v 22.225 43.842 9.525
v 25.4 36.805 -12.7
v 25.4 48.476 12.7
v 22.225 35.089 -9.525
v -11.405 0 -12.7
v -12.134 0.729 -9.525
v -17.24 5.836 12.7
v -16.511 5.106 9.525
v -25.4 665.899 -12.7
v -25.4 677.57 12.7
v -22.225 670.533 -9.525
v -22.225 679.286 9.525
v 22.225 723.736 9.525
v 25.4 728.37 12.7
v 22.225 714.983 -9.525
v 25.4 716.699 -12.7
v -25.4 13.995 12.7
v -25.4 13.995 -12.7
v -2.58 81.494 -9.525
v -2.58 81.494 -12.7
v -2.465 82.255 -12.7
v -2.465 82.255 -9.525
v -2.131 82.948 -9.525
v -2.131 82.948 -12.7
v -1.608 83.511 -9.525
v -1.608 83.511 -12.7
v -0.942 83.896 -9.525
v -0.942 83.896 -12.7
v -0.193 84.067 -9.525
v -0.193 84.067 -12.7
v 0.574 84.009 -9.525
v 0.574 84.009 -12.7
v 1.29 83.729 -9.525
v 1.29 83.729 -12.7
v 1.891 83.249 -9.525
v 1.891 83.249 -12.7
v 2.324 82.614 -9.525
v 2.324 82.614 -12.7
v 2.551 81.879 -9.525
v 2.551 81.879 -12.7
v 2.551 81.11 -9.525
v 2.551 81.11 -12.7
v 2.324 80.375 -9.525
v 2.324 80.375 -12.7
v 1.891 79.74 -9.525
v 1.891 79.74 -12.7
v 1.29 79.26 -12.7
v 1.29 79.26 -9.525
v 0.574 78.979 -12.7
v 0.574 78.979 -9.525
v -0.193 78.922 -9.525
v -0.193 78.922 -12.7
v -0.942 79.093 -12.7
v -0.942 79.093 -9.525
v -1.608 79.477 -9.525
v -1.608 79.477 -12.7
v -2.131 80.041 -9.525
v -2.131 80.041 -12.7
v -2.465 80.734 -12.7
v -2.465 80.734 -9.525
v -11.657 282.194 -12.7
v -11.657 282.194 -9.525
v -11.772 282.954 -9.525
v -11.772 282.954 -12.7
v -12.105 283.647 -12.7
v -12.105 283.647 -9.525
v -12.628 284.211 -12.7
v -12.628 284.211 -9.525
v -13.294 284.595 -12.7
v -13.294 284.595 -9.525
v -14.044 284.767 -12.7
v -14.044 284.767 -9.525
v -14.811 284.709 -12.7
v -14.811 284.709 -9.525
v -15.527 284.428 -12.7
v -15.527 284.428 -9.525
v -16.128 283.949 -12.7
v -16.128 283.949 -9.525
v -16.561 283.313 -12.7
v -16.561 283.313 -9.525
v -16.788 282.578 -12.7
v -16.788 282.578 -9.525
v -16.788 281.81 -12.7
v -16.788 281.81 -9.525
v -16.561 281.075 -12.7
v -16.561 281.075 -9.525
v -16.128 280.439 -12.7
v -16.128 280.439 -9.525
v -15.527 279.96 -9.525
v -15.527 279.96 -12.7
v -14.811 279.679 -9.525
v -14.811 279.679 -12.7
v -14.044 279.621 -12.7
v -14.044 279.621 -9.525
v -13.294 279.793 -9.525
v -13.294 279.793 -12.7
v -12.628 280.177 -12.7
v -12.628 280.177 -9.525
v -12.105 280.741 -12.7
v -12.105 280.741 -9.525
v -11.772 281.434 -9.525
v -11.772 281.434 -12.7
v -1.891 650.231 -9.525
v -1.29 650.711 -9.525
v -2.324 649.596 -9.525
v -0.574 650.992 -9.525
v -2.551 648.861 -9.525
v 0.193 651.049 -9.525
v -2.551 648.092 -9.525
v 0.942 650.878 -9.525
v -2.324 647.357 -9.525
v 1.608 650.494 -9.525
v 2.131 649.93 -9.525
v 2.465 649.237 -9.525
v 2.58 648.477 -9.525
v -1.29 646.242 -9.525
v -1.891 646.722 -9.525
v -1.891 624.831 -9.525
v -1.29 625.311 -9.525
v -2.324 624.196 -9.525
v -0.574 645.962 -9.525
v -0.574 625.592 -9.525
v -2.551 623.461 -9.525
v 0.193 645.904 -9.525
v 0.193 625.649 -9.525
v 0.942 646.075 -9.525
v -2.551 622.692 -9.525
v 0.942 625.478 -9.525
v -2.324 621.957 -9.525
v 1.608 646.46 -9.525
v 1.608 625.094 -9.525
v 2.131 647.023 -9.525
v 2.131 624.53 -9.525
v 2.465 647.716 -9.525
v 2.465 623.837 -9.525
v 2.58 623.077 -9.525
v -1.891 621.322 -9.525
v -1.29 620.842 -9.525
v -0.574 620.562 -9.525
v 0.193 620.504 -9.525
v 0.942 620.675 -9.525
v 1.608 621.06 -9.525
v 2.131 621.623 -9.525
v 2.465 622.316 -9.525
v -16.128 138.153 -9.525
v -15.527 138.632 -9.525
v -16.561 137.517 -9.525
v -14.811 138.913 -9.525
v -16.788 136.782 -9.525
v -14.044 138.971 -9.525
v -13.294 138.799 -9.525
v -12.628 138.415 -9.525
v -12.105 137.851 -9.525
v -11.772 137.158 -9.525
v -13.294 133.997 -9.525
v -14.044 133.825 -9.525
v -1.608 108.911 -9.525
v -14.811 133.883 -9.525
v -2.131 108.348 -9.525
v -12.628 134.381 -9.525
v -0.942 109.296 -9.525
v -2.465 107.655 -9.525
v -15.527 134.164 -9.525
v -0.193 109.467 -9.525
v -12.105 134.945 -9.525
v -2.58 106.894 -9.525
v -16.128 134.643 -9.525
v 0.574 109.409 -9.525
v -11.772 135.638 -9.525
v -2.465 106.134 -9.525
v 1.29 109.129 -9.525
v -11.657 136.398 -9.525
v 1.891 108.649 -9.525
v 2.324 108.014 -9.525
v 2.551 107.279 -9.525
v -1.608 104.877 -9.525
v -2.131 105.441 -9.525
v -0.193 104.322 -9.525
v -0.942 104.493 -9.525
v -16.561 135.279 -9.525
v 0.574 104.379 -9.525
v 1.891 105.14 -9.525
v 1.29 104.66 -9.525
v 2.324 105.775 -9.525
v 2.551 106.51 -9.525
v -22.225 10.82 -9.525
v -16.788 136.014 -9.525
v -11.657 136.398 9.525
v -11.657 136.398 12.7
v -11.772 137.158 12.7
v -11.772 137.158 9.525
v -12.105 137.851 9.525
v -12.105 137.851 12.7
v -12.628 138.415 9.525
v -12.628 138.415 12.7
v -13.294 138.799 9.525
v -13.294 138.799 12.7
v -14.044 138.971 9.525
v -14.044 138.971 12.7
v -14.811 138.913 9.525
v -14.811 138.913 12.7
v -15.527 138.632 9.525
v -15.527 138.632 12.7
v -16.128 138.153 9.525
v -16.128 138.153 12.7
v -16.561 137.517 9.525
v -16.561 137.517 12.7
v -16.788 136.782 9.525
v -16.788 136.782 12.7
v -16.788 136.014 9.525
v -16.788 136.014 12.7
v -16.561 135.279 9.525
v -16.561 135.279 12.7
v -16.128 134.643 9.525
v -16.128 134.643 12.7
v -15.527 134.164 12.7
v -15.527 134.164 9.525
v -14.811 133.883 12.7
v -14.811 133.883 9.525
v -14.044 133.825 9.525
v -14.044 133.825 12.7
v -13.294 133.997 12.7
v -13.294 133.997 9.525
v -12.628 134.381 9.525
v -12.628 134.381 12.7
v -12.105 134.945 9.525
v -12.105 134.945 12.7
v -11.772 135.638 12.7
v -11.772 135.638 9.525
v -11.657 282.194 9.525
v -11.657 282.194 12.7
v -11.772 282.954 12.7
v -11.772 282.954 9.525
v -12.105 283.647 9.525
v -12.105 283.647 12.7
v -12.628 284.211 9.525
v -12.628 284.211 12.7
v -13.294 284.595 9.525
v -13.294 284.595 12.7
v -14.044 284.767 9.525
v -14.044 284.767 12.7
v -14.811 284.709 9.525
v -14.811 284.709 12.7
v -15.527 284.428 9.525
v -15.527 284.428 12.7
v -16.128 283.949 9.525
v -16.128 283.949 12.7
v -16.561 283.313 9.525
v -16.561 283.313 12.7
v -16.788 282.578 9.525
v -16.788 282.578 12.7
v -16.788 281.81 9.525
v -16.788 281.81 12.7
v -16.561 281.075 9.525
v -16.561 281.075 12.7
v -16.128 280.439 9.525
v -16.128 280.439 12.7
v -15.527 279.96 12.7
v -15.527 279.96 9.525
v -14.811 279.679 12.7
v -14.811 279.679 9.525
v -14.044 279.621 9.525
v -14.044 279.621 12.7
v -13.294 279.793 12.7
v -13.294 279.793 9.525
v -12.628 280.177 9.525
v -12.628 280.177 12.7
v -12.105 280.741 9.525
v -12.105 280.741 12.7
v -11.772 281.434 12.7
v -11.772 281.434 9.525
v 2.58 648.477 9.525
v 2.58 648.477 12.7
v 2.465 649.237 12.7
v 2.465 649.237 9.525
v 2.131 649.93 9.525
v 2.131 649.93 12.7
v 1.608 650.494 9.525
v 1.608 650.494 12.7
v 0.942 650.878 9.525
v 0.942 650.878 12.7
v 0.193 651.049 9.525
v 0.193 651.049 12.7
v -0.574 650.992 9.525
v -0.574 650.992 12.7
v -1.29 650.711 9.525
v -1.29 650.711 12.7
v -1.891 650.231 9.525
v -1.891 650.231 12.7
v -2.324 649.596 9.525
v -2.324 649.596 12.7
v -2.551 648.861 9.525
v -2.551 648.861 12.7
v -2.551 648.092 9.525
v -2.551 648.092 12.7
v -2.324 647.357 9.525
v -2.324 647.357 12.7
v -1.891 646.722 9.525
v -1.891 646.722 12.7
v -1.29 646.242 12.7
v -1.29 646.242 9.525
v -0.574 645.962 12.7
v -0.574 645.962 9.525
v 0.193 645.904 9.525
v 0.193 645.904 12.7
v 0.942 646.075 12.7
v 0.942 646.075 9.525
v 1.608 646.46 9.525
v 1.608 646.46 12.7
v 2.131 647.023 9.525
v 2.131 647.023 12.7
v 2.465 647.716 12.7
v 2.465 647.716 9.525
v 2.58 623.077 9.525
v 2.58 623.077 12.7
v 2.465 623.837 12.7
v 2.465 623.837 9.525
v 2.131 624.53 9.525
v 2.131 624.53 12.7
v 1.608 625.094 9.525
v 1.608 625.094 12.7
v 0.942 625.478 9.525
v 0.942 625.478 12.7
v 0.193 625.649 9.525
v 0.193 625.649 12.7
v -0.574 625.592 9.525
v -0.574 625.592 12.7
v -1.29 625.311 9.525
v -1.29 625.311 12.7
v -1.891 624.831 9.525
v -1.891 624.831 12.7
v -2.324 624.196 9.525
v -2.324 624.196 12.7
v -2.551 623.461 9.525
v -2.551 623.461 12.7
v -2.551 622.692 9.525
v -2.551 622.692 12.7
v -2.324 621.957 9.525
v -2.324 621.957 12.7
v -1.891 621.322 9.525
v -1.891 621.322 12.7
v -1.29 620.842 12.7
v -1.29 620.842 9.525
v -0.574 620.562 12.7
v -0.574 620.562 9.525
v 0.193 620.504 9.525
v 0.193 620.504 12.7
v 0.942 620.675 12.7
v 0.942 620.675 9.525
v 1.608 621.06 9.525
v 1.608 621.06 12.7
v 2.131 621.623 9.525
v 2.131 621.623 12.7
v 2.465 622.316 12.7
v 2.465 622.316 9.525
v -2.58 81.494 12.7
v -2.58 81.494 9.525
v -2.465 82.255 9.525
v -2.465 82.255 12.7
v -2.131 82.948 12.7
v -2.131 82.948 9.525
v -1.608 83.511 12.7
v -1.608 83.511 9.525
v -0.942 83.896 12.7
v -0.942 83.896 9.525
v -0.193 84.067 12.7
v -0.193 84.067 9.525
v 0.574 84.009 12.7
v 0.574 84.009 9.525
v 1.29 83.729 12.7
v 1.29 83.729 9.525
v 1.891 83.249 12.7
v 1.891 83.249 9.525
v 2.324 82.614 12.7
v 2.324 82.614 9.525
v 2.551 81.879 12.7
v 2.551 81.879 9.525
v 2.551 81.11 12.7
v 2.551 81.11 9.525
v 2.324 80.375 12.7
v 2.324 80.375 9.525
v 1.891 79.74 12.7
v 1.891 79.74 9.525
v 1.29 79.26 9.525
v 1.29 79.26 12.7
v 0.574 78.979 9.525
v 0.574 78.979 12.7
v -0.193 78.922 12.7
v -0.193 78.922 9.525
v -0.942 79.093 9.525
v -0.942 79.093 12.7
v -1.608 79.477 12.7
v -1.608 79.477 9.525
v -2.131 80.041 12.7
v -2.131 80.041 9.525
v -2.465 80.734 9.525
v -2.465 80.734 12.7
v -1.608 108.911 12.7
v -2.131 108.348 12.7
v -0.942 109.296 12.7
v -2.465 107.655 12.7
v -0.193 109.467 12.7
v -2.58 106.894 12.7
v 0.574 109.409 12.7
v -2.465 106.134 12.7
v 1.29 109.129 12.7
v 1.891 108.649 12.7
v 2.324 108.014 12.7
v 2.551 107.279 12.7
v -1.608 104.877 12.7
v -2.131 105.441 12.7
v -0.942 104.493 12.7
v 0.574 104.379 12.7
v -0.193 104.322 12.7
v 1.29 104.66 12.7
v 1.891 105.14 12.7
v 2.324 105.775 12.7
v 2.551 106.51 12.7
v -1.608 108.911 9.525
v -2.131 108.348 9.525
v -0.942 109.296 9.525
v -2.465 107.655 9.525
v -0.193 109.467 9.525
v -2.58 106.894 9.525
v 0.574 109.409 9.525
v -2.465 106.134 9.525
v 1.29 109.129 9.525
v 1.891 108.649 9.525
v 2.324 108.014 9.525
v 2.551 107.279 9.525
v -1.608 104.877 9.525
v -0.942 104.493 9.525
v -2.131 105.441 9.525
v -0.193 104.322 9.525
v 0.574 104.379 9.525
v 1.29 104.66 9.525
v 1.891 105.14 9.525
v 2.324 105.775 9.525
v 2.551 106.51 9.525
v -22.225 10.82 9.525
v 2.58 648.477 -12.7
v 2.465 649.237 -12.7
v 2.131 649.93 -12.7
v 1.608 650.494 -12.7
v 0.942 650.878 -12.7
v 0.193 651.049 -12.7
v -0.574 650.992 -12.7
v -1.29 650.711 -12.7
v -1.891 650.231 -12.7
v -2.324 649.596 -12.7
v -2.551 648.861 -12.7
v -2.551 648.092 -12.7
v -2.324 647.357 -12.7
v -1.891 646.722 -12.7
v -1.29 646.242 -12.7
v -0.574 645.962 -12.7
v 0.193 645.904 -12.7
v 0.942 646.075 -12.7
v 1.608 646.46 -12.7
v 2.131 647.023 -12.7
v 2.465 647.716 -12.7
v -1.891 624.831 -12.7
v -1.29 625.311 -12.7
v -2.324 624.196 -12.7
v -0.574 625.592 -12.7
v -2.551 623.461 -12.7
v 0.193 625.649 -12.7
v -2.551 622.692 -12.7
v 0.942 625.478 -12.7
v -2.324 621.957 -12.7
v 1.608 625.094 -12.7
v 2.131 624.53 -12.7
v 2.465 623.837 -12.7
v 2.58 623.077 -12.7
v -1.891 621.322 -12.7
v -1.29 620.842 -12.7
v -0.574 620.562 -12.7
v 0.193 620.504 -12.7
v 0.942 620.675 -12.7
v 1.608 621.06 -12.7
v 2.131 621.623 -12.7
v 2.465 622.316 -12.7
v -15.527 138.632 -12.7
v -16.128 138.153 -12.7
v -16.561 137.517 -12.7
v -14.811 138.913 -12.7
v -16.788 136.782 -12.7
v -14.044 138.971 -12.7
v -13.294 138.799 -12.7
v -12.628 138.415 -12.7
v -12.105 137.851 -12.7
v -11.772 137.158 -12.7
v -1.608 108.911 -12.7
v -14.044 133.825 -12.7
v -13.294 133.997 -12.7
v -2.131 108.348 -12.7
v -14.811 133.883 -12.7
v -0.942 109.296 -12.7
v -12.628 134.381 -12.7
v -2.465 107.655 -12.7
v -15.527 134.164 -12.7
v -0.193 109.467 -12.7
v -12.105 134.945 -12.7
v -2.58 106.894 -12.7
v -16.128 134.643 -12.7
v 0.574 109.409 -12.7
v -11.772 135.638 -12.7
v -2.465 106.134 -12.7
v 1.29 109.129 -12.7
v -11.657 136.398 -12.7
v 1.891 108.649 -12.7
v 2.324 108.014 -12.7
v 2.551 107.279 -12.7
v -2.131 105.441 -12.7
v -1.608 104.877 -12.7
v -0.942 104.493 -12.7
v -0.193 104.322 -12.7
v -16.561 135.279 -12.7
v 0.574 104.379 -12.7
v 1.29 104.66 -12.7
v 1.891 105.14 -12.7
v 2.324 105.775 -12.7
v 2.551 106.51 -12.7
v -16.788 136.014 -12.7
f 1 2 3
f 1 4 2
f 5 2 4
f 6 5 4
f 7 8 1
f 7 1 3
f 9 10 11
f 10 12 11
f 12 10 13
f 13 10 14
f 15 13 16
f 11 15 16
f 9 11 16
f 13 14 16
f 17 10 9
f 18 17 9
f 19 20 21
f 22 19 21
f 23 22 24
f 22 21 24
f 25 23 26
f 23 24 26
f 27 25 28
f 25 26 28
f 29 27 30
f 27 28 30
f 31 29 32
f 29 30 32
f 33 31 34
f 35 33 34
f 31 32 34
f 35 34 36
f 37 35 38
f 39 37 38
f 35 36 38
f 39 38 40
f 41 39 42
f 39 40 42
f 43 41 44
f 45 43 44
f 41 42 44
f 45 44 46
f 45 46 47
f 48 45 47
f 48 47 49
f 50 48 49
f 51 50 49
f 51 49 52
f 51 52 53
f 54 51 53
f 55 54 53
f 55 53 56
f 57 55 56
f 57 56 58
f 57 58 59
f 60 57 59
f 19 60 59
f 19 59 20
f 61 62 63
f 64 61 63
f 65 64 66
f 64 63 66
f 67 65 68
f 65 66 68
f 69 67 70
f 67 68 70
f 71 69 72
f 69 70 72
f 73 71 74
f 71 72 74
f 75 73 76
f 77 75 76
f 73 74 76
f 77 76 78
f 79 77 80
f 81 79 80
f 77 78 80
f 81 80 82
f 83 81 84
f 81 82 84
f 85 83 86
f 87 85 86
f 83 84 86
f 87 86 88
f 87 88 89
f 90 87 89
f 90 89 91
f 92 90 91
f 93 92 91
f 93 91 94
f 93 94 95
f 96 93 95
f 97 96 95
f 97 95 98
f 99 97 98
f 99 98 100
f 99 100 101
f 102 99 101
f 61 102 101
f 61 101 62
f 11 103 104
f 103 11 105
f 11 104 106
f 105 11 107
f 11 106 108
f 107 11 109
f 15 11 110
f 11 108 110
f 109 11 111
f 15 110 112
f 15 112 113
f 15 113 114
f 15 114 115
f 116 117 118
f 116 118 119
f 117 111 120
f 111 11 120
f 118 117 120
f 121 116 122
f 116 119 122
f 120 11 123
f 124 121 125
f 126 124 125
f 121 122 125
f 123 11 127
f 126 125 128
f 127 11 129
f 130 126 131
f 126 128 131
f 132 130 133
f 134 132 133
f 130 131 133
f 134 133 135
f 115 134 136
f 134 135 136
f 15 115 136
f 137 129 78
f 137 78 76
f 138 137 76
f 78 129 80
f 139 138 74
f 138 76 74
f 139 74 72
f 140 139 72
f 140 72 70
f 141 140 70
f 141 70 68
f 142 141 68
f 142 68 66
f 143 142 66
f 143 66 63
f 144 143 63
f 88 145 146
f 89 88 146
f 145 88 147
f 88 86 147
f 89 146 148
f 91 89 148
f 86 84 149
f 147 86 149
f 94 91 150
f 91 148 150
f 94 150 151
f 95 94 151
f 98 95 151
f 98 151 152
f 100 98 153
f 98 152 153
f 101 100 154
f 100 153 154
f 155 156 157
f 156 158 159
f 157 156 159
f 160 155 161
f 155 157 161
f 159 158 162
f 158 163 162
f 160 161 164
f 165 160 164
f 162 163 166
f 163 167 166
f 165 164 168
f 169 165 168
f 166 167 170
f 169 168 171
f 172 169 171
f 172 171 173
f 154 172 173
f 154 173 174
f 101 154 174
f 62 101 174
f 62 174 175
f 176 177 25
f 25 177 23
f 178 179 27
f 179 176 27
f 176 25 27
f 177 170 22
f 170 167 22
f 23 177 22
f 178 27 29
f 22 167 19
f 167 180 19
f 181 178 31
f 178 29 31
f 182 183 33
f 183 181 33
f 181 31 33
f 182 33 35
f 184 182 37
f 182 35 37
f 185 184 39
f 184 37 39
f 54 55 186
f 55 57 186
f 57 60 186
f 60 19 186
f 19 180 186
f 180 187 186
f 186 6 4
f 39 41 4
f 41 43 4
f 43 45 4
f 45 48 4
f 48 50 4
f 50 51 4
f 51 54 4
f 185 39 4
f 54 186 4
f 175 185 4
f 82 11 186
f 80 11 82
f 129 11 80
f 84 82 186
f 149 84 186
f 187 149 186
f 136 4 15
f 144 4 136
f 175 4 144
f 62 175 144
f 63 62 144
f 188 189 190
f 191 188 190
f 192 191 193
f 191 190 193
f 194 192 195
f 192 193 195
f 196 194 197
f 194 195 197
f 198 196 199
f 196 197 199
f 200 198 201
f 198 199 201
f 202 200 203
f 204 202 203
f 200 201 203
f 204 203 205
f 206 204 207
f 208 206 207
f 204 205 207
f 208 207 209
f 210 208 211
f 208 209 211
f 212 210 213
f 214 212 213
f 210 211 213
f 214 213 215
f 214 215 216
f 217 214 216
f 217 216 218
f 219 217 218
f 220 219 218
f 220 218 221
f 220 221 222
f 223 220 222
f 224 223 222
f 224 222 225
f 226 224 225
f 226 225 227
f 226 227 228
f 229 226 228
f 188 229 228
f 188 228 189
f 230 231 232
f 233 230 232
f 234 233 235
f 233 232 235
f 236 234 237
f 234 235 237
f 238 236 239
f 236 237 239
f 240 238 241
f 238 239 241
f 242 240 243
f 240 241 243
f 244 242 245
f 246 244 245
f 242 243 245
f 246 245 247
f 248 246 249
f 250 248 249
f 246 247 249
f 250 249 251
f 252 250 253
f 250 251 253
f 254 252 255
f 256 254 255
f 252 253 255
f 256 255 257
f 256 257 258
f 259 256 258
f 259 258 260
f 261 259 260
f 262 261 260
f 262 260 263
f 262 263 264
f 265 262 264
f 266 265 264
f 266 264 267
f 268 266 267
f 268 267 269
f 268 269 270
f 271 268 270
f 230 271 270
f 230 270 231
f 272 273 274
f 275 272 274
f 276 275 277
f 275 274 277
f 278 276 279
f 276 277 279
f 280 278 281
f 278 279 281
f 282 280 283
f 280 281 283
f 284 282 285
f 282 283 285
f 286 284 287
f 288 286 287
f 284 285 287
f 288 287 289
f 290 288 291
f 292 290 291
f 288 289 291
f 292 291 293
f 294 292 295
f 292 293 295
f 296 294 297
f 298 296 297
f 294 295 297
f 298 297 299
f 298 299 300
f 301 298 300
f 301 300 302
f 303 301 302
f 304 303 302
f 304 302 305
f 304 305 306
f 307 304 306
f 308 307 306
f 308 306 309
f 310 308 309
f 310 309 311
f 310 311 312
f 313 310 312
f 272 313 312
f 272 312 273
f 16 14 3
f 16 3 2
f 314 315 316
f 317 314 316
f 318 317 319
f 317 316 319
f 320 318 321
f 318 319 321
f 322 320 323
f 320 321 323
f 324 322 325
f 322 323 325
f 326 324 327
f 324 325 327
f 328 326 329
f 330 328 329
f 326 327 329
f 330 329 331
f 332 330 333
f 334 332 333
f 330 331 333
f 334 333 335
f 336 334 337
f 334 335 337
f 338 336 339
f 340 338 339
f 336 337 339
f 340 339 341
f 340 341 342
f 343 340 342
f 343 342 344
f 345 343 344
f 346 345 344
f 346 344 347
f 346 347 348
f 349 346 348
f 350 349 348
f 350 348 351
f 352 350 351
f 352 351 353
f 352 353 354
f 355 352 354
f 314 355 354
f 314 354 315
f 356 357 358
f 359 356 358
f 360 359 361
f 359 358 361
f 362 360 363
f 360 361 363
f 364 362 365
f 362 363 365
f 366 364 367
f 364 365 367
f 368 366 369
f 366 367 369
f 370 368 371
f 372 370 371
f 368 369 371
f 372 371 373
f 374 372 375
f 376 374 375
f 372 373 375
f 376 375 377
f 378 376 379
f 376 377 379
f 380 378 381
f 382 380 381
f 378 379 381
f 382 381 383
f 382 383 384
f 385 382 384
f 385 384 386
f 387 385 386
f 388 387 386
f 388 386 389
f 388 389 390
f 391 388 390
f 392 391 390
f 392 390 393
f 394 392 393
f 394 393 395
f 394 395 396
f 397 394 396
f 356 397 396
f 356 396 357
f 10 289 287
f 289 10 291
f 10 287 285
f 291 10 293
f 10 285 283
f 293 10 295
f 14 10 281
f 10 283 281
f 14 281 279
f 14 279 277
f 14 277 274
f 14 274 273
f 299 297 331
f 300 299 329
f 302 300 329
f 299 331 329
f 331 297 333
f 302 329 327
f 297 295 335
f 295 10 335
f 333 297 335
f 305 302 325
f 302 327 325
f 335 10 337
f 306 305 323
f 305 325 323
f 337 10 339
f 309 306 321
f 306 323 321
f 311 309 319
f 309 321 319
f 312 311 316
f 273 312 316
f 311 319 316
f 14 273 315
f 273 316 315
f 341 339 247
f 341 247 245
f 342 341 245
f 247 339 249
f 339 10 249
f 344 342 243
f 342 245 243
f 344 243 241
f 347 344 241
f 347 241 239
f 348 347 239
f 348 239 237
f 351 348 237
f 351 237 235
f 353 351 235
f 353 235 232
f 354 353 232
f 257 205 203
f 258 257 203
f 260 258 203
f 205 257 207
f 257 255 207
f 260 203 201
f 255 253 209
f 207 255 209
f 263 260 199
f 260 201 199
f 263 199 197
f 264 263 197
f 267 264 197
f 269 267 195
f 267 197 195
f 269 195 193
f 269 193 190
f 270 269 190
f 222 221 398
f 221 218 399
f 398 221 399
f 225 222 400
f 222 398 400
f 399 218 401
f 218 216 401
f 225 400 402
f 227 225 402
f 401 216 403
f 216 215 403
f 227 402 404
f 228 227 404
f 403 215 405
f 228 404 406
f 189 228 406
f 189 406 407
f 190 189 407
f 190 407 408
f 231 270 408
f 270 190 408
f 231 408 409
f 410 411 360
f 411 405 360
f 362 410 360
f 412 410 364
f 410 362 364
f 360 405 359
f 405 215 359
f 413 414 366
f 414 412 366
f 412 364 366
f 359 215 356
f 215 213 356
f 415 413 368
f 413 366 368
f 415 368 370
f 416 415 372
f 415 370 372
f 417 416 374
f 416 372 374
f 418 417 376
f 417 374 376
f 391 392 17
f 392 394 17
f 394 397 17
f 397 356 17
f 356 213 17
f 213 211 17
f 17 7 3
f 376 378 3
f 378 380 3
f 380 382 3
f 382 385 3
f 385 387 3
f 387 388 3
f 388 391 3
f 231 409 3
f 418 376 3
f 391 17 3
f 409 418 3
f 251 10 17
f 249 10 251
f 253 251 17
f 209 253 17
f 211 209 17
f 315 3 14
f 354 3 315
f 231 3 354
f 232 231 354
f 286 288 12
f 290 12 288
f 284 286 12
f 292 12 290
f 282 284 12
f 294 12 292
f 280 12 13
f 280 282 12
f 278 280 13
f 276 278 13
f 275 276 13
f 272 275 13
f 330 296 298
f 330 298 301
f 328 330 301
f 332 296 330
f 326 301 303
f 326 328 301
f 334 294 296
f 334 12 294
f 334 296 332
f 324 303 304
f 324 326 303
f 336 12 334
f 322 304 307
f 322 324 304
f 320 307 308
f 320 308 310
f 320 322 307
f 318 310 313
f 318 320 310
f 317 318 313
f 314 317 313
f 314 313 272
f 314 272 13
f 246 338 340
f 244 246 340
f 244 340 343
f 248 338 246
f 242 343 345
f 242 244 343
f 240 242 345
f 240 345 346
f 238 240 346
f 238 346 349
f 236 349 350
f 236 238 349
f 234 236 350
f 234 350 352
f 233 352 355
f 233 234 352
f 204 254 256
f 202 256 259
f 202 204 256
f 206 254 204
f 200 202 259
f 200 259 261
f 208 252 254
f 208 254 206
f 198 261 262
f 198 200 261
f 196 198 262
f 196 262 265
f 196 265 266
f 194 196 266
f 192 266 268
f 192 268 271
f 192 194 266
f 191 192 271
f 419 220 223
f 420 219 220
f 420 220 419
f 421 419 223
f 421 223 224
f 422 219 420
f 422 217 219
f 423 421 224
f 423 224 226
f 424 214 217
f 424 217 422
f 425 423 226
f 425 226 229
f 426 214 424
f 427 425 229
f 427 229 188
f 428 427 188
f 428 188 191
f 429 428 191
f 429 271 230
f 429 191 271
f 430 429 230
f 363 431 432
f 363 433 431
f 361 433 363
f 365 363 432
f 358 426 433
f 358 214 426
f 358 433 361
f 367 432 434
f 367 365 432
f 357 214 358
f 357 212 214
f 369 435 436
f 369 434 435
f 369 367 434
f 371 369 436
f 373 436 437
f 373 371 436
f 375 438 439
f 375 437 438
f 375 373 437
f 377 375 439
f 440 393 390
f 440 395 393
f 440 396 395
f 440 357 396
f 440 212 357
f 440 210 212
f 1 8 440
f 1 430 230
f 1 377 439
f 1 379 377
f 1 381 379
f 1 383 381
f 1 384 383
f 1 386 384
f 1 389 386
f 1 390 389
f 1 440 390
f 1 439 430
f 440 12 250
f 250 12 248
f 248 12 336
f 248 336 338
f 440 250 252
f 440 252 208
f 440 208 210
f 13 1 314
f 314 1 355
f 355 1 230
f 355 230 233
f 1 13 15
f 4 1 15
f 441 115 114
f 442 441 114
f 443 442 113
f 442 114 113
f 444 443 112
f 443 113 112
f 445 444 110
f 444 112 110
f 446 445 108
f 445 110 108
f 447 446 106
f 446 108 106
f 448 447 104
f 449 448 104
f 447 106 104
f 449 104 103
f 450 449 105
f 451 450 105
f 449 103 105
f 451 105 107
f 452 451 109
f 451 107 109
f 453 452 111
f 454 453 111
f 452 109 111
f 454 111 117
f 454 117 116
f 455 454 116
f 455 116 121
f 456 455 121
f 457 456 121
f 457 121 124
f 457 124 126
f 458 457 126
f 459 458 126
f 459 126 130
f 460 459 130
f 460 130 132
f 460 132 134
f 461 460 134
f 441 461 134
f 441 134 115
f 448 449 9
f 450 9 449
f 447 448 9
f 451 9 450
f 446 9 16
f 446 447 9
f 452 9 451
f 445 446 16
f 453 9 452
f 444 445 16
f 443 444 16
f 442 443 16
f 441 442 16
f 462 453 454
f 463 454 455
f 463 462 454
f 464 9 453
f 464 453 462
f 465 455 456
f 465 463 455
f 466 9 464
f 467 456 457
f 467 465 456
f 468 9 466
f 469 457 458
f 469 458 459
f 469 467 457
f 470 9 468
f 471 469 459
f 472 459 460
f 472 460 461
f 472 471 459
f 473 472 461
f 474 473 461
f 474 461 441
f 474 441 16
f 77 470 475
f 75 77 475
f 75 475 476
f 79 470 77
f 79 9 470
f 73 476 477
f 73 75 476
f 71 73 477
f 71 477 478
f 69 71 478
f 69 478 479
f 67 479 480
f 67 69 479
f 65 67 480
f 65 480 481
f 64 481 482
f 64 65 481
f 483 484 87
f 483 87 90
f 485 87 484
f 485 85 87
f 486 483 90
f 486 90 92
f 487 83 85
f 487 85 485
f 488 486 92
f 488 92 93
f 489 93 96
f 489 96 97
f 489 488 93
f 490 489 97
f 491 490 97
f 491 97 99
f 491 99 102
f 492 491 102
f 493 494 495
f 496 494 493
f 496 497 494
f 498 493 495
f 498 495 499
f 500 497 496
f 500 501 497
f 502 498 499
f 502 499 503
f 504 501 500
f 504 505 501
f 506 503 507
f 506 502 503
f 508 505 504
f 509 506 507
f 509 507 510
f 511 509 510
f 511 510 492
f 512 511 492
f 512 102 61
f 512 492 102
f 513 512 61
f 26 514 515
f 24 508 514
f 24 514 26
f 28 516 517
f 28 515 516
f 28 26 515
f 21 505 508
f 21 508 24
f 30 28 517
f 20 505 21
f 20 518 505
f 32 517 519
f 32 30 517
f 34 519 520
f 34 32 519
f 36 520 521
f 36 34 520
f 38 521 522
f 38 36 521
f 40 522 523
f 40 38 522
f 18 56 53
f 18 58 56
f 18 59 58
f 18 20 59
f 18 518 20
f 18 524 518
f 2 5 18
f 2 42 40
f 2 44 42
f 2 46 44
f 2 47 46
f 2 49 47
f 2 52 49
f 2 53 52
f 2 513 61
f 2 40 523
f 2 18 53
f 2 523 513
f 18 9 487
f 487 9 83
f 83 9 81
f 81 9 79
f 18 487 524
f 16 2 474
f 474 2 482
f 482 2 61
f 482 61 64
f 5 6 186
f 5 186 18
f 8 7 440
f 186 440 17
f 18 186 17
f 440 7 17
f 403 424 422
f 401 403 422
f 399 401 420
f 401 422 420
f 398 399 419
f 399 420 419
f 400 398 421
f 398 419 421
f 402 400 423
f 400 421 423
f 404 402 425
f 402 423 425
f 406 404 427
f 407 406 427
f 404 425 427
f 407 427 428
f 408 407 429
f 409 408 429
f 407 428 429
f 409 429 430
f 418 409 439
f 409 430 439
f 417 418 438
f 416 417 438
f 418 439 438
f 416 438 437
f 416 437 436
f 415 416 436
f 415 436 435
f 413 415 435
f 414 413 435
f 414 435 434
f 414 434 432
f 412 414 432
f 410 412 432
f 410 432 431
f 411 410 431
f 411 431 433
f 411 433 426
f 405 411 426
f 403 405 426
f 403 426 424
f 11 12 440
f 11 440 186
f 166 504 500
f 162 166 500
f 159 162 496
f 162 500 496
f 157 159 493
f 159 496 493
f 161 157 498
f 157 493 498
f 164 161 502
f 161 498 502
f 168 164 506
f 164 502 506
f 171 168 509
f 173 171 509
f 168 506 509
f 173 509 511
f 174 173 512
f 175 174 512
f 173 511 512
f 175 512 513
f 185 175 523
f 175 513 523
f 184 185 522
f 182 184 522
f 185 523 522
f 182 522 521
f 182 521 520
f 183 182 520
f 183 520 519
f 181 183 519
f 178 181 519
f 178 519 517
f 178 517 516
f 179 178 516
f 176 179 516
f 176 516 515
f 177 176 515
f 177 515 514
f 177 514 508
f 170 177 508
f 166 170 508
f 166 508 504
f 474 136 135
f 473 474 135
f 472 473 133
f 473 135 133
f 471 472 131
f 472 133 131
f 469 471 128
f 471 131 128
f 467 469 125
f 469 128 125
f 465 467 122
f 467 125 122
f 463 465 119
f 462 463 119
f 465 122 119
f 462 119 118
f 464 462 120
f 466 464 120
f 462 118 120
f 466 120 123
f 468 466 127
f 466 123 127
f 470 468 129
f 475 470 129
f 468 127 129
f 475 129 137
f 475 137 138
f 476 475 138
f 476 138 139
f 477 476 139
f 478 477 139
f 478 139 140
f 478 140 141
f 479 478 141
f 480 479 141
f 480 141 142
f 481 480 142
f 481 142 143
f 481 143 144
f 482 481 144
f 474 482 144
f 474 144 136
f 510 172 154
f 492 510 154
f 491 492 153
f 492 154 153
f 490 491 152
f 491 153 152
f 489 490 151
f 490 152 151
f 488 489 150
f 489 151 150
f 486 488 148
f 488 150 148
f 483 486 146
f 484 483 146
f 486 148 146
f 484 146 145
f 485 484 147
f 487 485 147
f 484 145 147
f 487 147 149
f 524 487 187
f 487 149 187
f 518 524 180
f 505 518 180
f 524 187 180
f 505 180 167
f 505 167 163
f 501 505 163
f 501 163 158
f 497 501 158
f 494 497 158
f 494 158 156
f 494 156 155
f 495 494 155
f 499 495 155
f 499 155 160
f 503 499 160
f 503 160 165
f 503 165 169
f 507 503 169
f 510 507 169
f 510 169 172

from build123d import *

# Parameters (mm, degrees)
SKETCH1_W                        = 50.8
SKETCH1_H                        = 25.4
SKETCH1_W_2                      = 44.45
SKETCH1_H_2                      = 19.05
BOSS_EXTRUDE1_DEPTH              = 728.3704
CUT_EXTRUDE1_DEPTH               = 730.255620202
CUT_EXTRUDE2_DEPTH               = 552.395616702
CUT_EXTRUDE3_DEPTH               = 735.841052167
F_13_64_0_20313_DIAMETER_HOLE1_D = 5.159502
F_13_64_0_20313_DIAMETER_HOLE2_D = 5.159502


with BuildPart() as part:
    # Sketch1 → Boss-Extrude1 (new body)
    with BuildSketch(Plane(origin=(0, 0, 0), x_dir=(1, 0, 0), z_dir=(0, 1, 0))):
        Rectangle(SKETCH1_W, SKETCH1_H)
        Rectangle(SKETCH1_W_2, SKETCH1_H_2, mode=Mode.SUBTRACT)
    extrude(amount=BOSS_EXTRUDE1_DEPTH)

    # Sketch2 → Cut-Extrude1 (cut, through all)
    with BuildSketch(Plane.XY.offset(12.7)):
        Polygon((-25.4, 677.5704), (25.4, 728.3704), (-25.4, 728.3704), align=None)
        Polygon((-11.4046, 0), (-25.4, 13.9954), (-25.4, 0), align=None)
        Polygon((-11.4046, 0), (25.4, 36.8046), (25.4, 0), align=None)
    extrude(amount=-CUT_EXTRUDE1_DEPTH, mode=Mode.SUBTRACT)

    # Sketch3 → Cut-Extrude2 (cut, through all)
    with BuildSketch(Plane(origin=(376.8852, 376.8852, 0), x_dir=(0, 0, -1), z_dir=(0.7071067811865417, 0.7071067811865535, 0))):
        Polygon((-12.7, 497.075136813), (12.7, 488.822176529), (12.7, 497.075136813), align=None)
    extrude(amount=-CUT_EXTRUDE2_DEPTH, mode=Mode.SUBTRACT)

    # Sketch4 → Cut-Extrude3 (cut, through all)
    with BuildSketch(Plane(origin=(-5.7023, -5.7023, 0), x_dir=(0, 0, 1), z_dir=(-0.7071067811865477, -0.7071067811865475, 0))):
        Polygon((-12.7, 8.064269997), (12.7, 16.317230281), (12.7, 8.064269997), align=None)
    extrude(amount=-CUT_EXTRUDE3_DEPTH, mode=Mode.SUBTRACT)

    # 13/64 (0.20313) Diameter Hole1 (through all)
    with Locations(Plane(origin=(0, 0, -12.7), x_dir=(-1, 0, 0), z_dir=(0, 0, -1))):
        with Locations((0, 623.07659026), (0, 648.47659026), (14.2367, 282.194), (14.2367, 136.398)):
            Hole(F_13_64_0_20313_DIAMETER_HOLE1_D / 2)

    # 13/64 (0.20313) Diameter Hole2 (through all)
    with Locations(Plane.XY.offset(12.7)):
        with Locations((0, 106.89437358), (0, 81.49437358)):
            Hole(F_13_64_0_20313_DIAMETER_HOLE2_D / 2)


solid = part.part
